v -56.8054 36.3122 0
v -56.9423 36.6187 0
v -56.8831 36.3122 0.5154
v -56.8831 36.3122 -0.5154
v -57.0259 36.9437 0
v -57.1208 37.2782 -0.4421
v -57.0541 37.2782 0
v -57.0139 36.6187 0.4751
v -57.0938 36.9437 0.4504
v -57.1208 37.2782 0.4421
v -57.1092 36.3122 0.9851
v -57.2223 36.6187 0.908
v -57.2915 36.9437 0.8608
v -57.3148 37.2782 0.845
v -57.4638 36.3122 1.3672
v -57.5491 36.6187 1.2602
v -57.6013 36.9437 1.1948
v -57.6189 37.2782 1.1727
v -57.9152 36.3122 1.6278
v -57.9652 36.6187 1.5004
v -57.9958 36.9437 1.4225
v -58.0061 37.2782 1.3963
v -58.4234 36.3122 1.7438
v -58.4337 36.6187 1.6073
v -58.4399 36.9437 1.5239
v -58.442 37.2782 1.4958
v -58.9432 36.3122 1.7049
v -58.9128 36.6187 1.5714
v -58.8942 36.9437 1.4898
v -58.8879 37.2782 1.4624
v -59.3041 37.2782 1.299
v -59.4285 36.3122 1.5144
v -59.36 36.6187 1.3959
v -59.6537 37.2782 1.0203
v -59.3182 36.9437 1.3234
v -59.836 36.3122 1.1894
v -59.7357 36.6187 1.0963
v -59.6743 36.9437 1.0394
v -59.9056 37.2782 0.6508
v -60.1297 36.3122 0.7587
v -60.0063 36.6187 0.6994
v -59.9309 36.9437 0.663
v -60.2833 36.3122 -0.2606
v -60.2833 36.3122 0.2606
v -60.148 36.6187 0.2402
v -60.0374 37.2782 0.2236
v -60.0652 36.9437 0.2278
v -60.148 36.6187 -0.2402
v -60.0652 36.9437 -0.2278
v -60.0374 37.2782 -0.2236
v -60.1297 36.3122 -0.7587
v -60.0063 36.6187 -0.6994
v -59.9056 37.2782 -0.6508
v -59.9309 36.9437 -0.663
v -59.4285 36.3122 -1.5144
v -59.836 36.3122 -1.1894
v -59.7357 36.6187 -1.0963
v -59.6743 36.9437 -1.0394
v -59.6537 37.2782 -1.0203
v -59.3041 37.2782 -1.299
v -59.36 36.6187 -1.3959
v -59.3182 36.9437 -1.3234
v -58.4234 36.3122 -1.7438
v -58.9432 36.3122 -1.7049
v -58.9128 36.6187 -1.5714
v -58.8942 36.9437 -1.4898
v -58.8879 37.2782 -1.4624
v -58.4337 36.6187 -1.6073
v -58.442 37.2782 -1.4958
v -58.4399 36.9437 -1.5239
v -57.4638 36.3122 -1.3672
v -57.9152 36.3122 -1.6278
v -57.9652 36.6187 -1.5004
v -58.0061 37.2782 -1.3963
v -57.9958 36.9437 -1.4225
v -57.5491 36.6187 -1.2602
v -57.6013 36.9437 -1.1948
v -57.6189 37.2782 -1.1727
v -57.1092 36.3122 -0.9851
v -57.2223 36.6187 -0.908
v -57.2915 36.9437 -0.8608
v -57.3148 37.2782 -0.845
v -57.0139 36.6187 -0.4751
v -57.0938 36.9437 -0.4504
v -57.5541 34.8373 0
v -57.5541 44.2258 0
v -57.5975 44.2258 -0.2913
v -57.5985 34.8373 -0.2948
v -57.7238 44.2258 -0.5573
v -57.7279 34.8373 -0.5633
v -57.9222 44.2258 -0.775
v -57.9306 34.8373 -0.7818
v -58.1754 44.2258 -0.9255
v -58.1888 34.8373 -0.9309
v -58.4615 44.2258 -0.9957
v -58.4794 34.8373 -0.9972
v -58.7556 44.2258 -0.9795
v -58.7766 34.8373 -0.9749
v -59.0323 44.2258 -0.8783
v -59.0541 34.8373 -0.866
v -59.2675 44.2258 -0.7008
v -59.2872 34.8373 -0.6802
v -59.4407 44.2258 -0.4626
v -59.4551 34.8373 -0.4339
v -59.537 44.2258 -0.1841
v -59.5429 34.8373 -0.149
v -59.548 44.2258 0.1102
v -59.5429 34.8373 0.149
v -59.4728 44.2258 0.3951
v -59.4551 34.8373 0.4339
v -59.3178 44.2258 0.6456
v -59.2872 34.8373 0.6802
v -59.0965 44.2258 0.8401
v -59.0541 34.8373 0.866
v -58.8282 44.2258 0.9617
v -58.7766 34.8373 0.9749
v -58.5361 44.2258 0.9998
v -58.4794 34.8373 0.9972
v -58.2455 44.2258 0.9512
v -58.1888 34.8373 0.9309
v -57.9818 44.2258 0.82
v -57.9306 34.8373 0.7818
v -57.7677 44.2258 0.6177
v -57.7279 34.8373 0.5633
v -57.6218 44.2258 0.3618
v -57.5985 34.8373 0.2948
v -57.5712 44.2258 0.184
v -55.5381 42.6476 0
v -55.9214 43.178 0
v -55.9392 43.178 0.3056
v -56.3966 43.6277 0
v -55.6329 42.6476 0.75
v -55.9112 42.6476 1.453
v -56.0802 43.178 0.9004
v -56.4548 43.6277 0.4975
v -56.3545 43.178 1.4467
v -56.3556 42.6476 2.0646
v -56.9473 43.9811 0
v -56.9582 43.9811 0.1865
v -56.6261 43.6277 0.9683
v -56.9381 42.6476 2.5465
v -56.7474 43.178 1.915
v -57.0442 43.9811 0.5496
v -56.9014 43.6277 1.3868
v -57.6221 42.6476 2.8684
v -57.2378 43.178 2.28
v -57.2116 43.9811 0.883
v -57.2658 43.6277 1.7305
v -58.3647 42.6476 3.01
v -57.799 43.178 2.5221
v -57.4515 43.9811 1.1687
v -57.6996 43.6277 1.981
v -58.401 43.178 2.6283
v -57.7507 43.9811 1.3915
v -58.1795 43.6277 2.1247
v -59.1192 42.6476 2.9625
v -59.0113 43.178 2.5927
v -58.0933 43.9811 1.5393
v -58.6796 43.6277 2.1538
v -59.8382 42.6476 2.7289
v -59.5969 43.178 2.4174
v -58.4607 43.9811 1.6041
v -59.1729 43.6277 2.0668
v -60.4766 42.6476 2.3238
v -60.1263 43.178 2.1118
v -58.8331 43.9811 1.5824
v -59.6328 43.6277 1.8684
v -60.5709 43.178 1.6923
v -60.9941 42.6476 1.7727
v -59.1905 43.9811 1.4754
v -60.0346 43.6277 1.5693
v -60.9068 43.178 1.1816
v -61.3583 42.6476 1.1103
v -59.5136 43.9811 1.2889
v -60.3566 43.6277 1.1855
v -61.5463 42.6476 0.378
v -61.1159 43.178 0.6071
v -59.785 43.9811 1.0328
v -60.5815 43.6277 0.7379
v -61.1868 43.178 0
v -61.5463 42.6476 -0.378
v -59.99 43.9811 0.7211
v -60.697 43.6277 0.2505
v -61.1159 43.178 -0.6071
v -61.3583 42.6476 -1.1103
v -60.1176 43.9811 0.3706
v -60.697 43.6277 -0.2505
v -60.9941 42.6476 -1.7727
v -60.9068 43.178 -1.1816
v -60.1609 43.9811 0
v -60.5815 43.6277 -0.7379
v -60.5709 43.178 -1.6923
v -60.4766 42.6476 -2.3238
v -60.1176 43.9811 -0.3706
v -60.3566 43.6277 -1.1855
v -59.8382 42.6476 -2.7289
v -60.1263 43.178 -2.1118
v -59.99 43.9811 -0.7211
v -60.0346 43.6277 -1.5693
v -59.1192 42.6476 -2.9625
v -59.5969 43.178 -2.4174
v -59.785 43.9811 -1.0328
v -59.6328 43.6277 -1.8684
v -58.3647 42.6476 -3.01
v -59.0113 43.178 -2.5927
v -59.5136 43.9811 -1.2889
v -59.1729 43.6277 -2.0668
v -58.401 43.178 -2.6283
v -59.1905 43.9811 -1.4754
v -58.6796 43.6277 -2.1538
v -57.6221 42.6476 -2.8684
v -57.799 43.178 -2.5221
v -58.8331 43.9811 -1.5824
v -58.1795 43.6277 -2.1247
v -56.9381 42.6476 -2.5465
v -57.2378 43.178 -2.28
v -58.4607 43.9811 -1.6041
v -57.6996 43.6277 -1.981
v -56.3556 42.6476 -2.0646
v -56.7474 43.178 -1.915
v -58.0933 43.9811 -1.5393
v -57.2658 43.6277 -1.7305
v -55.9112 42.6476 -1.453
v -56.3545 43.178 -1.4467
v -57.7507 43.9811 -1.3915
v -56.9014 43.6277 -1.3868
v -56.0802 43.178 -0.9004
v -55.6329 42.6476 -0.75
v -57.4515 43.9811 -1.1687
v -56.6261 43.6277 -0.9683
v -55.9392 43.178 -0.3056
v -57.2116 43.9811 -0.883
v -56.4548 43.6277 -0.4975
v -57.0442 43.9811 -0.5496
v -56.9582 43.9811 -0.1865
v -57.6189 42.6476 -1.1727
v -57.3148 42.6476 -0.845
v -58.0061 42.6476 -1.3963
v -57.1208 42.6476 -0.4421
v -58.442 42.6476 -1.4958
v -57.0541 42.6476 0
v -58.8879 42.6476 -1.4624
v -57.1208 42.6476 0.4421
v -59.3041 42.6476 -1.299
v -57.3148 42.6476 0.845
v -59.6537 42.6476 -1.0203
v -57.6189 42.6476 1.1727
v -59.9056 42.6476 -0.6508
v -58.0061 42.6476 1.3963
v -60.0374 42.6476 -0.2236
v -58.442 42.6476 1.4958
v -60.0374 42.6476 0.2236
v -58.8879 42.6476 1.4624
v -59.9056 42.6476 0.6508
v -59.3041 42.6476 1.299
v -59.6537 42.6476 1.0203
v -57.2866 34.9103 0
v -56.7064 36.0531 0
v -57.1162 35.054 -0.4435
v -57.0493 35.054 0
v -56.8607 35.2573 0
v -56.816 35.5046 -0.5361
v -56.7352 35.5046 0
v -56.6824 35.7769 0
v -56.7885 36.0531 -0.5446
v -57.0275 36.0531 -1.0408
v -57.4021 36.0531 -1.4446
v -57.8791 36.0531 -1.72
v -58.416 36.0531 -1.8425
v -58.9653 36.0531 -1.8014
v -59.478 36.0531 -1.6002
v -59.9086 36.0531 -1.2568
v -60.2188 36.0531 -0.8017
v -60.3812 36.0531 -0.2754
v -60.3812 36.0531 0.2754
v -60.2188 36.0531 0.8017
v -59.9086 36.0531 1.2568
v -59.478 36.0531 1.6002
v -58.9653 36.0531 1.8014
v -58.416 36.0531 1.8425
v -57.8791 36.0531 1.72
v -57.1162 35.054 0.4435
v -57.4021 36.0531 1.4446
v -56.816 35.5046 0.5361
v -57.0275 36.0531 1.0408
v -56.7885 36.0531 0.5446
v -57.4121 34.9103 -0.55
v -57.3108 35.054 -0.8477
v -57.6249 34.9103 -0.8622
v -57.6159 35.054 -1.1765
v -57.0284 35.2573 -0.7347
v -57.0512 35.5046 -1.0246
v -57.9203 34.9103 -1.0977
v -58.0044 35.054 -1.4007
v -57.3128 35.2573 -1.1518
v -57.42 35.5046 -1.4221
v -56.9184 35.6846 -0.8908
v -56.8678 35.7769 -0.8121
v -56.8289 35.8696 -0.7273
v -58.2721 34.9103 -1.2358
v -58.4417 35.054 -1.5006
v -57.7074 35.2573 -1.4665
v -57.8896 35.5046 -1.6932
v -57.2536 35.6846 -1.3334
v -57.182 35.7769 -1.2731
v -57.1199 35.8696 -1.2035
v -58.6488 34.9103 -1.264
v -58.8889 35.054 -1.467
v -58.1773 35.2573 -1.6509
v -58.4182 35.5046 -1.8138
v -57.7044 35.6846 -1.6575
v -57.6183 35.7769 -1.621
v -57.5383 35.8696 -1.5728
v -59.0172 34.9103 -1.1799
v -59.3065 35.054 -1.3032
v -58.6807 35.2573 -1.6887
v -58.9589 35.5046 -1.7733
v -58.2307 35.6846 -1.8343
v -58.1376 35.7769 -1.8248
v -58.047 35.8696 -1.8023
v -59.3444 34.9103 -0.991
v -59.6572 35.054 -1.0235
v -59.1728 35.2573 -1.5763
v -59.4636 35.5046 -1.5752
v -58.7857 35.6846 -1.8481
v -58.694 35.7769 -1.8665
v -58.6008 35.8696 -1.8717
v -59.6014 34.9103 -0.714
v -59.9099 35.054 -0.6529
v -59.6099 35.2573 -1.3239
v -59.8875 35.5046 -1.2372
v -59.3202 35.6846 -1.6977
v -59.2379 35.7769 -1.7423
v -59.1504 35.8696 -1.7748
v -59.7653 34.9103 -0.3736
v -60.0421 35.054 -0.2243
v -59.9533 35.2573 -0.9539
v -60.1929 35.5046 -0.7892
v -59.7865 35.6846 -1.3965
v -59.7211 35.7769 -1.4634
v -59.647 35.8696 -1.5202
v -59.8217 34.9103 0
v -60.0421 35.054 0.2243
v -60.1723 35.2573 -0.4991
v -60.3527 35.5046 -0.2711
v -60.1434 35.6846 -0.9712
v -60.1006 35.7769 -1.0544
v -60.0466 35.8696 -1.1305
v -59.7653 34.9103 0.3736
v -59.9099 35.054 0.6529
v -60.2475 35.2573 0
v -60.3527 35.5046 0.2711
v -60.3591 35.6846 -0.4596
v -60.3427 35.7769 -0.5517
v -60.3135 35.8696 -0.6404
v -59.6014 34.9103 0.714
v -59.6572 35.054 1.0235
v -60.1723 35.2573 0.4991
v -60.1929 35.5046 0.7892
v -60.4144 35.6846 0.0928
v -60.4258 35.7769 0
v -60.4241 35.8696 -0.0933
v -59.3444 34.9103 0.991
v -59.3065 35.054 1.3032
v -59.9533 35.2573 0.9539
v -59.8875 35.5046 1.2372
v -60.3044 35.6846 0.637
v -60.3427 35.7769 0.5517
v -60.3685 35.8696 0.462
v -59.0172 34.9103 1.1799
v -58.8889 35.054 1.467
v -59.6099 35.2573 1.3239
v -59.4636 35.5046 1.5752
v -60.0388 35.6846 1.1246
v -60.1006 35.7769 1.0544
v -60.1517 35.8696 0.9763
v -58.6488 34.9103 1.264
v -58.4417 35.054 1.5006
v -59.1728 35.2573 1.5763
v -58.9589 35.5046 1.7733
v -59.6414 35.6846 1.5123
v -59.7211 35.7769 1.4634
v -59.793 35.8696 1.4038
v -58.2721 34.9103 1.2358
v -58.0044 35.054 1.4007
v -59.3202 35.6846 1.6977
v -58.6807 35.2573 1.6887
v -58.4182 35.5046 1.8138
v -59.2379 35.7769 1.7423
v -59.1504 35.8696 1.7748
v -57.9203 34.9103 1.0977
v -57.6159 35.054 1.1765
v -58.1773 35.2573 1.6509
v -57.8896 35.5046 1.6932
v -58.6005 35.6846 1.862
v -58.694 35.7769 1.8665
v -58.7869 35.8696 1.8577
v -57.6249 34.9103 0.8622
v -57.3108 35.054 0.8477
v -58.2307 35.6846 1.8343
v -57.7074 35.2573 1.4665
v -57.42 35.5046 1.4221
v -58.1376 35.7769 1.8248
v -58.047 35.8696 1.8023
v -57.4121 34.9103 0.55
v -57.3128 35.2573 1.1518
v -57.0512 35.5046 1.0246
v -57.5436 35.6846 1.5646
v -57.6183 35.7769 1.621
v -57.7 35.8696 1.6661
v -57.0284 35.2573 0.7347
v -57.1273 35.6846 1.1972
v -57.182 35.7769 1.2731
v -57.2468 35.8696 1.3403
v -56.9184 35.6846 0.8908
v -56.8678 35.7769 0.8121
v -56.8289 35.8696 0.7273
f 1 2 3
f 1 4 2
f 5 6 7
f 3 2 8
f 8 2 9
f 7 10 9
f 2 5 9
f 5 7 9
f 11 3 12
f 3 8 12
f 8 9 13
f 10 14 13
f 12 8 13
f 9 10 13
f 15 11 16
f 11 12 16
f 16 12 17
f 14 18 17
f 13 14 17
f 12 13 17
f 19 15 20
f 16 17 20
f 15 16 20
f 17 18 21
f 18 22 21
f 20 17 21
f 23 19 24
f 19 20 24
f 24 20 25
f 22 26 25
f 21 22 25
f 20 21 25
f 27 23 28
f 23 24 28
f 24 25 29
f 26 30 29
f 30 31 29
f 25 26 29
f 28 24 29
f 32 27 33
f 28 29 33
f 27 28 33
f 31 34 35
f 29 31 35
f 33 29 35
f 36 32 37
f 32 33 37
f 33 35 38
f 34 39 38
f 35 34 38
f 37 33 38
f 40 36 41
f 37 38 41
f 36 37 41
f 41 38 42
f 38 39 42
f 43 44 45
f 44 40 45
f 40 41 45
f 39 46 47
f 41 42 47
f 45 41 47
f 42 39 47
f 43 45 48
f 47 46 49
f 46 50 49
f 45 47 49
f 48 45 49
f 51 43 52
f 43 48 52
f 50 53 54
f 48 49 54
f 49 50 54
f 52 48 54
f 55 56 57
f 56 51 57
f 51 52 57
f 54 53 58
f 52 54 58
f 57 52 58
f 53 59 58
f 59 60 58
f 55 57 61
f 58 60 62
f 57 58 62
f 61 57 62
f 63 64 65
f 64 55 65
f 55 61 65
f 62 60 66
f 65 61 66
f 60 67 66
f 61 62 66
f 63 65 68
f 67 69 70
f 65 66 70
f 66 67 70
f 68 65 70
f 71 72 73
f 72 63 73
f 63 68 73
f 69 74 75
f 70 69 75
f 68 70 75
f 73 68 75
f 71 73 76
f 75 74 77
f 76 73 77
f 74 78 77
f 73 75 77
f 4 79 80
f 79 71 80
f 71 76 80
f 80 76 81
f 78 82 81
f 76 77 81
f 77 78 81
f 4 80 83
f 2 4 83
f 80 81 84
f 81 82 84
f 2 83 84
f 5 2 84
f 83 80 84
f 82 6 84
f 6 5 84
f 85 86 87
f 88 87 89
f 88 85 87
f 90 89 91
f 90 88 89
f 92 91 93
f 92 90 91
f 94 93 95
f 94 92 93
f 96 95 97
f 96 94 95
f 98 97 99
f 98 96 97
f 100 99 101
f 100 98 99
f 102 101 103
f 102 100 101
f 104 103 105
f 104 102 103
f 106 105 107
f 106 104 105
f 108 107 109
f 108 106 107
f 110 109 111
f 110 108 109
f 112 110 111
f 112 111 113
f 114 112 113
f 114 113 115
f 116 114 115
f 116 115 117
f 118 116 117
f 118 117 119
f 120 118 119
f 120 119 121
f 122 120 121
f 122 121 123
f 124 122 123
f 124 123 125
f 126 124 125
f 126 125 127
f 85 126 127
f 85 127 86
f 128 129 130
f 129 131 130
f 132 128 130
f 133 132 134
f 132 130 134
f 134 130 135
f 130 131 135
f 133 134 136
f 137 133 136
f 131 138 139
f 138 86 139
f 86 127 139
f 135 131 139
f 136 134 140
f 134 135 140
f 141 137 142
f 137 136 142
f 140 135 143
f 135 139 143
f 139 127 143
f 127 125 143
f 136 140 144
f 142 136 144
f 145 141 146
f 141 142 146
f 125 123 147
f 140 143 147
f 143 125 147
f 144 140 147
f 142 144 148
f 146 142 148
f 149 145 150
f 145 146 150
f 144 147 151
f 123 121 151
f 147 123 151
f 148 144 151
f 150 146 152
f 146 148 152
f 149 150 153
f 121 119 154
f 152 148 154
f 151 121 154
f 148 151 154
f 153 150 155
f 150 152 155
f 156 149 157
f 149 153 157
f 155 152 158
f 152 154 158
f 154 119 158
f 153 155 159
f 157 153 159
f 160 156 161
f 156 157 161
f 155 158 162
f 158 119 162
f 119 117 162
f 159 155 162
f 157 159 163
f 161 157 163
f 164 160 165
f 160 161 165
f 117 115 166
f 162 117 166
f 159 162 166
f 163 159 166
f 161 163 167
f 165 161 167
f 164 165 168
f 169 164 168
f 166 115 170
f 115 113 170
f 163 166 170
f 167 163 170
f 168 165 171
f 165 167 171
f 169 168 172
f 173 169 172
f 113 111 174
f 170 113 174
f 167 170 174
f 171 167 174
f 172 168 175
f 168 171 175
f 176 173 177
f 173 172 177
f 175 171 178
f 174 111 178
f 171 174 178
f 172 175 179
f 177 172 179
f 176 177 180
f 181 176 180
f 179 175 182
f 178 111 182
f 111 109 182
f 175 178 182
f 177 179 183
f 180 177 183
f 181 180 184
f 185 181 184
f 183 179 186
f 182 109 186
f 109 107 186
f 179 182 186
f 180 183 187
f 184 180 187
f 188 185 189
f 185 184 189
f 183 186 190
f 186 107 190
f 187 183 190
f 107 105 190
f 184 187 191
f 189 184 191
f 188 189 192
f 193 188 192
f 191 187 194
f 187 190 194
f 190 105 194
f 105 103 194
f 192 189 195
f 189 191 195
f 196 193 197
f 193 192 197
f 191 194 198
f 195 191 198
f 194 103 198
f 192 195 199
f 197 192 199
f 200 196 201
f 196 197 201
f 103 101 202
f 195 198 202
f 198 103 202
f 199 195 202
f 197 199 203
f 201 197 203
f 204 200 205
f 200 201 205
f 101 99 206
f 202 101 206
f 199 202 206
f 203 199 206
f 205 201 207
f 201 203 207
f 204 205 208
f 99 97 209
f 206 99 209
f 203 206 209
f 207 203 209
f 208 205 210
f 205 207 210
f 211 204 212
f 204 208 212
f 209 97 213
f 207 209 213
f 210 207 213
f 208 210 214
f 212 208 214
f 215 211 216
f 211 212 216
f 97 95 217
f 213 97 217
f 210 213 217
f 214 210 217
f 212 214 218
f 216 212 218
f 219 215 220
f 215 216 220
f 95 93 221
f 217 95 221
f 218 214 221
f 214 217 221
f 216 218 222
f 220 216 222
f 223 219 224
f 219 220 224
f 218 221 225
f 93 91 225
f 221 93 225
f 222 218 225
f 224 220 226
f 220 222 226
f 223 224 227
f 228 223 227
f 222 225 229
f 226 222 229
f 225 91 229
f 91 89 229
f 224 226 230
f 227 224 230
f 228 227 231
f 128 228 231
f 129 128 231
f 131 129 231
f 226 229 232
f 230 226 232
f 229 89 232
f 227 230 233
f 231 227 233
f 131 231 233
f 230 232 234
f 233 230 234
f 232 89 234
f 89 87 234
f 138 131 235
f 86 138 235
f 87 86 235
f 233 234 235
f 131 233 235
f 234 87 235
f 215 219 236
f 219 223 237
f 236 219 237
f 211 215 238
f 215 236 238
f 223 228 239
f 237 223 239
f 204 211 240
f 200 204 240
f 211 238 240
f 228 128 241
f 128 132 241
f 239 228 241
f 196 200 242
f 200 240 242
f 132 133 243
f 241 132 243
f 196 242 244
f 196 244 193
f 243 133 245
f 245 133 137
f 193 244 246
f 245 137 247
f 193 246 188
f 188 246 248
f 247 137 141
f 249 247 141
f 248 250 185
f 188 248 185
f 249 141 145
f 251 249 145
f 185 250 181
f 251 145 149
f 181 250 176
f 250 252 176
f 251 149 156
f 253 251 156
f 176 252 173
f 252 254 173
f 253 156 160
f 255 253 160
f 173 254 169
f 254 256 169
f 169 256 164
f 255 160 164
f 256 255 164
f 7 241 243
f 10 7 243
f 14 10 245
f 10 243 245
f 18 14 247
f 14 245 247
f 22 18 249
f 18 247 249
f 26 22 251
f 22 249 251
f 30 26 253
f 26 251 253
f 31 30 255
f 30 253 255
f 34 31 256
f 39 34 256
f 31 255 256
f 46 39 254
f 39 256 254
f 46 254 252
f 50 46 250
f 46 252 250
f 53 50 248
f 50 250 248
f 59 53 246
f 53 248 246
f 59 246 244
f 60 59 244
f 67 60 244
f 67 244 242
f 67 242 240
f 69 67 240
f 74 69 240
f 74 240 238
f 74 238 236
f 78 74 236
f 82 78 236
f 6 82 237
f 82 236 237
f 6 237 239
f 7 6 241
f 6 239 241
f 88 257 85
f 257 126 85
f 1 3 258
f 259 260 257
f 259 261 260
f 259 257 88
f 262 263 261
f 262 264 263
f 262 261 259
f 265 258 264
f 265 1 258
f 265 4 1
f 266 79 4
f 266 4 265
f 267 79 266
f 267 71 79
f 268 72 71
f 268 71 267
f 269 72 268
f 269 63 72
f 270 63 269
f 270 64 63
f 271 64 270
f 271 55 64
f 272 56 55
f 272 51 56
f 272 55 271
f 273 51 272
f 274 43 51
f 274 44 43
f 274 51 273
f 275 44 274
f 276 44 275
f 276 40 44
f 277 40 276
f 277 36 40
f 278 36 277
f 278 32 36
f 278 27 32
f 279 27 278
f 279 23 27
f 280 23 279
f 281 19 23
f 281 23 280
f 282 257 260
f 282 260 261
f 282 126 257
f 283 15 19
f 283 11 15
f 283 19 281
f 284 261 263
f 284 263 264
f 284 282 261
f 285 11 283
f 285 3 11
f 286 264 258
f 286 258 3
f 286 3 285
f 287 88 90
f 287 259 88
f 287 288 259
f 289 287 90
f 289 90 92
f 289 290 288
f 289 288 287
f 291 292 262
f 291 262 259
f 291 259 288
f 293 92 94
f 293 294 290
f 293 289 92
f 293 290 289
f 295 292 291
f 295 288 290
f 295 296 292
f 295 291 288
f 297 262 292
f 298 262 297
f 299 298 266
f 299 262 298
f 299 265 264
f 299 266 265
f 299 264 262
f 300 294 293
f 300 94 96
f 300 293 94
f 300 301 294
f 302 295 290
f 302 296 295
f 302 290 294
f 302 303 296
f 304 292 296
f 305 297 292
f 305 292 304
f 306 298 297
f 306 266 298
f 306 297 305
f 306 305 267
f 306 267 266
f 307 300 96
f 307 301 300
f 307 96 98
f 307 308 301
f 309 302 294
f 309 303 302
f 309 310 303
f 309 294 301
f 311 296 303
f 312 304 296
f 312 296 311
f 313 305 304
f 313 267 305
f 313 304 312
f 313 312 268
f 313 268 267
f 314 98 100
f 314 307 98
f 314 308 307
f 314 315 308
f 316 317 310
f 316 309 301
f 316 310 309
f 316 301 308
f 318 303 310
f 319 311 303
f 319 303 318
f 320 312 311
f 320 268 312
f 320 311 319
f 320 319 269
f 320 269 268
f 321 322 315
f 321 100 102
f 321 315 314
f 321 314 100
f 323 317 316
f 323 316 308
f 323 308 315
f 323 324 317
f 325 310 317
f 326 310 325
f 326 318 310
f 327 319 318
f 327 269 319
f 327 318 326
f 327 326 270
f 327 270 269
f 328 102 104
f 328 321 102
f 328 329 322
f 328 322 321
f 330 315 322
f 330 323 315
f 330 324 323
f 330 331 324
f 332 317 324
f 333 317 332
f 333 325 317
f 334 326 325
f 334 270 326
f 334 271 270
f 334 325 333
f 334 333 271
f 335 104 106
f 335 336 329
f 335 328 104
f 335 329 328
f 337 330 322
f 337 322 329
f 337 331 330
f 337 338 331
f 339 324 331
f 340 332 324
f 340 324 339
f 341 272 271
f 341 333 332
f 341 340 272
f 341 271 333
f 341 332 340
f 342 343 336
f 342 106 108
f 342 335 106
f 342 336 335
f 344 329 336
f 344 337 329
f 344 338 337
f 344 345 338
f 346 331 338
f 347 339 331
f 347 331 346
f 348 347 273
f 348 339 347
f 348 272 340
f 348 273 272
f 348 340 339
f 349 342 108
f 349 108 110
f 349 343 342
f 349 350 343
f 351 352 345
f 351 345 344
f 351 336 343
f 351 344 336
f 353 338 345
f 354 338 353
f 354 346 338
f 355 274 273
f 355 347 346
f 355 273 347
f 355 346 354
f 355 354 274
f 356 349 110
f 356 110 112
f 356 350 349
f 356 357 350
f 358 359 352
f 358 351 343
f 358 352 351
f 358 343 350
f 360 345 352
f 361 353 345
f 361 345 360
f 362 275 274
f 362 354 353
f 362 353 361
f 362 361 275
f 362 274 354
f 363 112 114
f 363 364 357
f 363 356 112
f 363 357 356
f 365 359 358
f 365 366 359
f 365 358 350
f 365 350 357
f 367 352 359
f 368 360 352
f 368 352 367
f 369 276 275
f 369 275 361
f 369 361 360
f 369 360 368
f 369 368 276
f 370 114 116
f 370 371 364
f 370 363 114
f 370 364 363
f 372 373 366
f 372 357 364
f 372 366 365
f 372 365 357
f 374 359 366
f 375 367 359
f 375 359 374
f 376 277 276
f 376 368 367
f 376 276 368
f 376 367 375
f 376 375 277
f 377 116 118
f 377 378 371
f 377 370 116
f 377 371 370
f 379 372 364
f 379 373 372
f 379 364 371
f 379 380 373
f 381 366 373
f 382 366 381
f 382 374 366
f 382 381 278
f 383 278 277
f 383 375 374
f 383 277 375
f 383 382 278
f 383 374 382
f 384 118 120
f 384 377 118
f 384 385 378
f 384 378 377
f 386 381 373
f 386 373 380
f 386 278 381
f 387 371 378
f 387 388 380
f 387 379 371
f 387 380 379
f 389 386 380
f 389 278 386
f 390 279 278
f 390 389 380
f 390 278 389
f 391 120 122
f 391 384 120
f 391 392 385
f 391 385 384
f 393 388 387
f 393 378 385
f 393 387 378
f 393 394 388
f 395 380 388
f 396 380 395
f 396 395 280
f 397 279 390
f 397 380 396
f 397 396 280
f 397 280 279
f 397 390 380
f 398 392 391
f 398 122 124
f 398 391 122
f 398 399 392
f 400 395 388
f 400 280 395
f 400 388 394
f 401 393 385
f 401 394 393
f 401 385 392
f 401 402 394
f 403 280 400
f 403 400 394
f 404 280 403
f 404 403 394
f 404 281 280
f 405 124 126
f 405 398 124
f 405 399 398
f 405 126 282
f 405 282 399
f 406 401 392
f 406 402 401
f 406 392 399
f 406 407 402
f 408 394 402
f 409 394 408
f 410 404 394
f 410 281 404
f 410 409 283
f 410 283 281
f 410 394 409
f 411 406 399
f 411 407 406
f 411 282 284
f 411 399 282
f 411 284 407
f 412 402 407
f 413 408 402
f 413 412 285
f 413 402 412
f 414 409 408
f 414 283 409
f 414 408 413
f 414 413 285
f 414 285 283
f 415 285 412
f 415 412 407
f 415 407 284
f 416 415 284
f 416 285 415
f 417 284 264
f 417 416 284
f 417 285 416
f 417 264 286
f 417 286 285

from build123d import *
from build123d.topology import SkipClean

# Parameters (mm, degrees)
SKETCH_2_R          = 1
CUT_EXTRUDE_1_DEPTH = 50
SKETCH_3_W          = 30
SKETCH_3_H          = 1.543001366
CUT_EXTRUDE_2_DEPTH = 5
FILLET_1_R          = 1


with BuildPart() as part:
    # 草图1 → 旋转1 (revolve)
    with SkipClean():  # the faces are left unmerged after this step: merging them gives an invalid solid
        with BuildSketch(Plane.XY):
            with BuildLine():
                Line((-57.054109227, 42.647640507), (-58.554109227, 42.647640507))
                Line((-58.554109227, 42.647640507), (-58.554109227, 33.247028335))
                ThreePointArc((-58.554109227, 33.247028335), (-56.797365364, 34.258679156), (-56.790595512, 36.285879333))
                ThreePointArc((-56.790595512, 36.285879333), (-56.987108525, 36.764821339), (-57.054109227, 37.278157209))
                Line((-57.054109227, 37.278157209), (-57.054109227, 42.647640507))
            make_face()
            with BuildLine():
                ThreePointArc((-58.554109227, 44.37170043), (-60.291090766, 43.910268372), (-61.570072895, 42.647640507))
                Line((-61.570072895, 42.647640507), (-60.054109227, 42.647640507))
                Line((-60.054109227, 42.647640507), (-58.554109227, 42.647640507))
                Line((-58.554109227, 42.647640507), (-58.554109227, 44.37170043))
            make_face()
            with BuildLine():
                ThreePointArc((-55.53814556, 42.647640507), (-56.817127689, 43.910268372), (-58.554109227, 44.37170043))
                Line((-58.554109227, 44.37170043), (-58.554109227, 42.647640507))
                Line((-58.554109227, 42.647640507), (-57.054109227, 42.647640507))
                Line((-57.054109227, 42.647640507), (-55.53814556, 42.647640507))
            make_face()
        revolve(axis=Axis((-58.554109227, 44.37170043, 0), (0, -1, 0)))
    add(part.part.scale(1), mode=Mode.REPLACE)  # the faces are merged on a copy

    # 草图2 → 切除-拉伸1 (cut)
    with BuildSketch(Plane(origin=(0, 0, 0), x_dir=(1, 0, 0), z_dir=(0, 1, 0))):
        with Locations((-58.554109227, 0)):
            Circle(SKETCH_2_R)
    extrude(amount=CUT_EXTRUDE_1_DEPTH, mode=Mode.SUBTRACT)

    # 草图3 → 切除-拉伸2 (cut, symmetric)
    with BuildSketch(Plane.XY):
        with Locations((-45.847587109, 34.065831969)):
            Rectangle(SKETCH_3_W, SKETCH_3_H)
    extrude(amount=CUT_EXTRUDE_2_DEPTH, both=True, mode=Mode.SUBTRACT)

    # 圆角1
    # the kernel refuses this fillet: 1 mm, written as the material it takes off along each edge
    with BuildSketch(Plane(origin=(-58.554109227, 34.837332652, 0), x_dir=(1, 0, 0), z_dir=(0, 0, 1))) as fillet_1_piece_1:
        with BuildLine():
            CenterArc((0.873089514, 0.991914174), FILLET_1_R, 277.291097339, 111.588468761)
            Line((1.748726343, 1.474884302), (1.836290026, 1.523181315))
            ThreePointArc((1.836290026, 1.523181315), (1.85033803, 1.498160575), (2.080331258, -0.021703426))
            Line((2.080331258, -0.021703426), (1.982714859, -0.1))
            ThreePointArc((1.982714859, -0.1), (1.49135743, -0.1), (1.012691049, -0.099191417))
            Line((1.012691049, -0.099191417), (1, 0))
        make_face()
    revolve(axis=Axis((-58.554109227, 34.837332652, 0), (0, 1, 0)), mode=Mode.SUBTRACT)


solid = part.part
